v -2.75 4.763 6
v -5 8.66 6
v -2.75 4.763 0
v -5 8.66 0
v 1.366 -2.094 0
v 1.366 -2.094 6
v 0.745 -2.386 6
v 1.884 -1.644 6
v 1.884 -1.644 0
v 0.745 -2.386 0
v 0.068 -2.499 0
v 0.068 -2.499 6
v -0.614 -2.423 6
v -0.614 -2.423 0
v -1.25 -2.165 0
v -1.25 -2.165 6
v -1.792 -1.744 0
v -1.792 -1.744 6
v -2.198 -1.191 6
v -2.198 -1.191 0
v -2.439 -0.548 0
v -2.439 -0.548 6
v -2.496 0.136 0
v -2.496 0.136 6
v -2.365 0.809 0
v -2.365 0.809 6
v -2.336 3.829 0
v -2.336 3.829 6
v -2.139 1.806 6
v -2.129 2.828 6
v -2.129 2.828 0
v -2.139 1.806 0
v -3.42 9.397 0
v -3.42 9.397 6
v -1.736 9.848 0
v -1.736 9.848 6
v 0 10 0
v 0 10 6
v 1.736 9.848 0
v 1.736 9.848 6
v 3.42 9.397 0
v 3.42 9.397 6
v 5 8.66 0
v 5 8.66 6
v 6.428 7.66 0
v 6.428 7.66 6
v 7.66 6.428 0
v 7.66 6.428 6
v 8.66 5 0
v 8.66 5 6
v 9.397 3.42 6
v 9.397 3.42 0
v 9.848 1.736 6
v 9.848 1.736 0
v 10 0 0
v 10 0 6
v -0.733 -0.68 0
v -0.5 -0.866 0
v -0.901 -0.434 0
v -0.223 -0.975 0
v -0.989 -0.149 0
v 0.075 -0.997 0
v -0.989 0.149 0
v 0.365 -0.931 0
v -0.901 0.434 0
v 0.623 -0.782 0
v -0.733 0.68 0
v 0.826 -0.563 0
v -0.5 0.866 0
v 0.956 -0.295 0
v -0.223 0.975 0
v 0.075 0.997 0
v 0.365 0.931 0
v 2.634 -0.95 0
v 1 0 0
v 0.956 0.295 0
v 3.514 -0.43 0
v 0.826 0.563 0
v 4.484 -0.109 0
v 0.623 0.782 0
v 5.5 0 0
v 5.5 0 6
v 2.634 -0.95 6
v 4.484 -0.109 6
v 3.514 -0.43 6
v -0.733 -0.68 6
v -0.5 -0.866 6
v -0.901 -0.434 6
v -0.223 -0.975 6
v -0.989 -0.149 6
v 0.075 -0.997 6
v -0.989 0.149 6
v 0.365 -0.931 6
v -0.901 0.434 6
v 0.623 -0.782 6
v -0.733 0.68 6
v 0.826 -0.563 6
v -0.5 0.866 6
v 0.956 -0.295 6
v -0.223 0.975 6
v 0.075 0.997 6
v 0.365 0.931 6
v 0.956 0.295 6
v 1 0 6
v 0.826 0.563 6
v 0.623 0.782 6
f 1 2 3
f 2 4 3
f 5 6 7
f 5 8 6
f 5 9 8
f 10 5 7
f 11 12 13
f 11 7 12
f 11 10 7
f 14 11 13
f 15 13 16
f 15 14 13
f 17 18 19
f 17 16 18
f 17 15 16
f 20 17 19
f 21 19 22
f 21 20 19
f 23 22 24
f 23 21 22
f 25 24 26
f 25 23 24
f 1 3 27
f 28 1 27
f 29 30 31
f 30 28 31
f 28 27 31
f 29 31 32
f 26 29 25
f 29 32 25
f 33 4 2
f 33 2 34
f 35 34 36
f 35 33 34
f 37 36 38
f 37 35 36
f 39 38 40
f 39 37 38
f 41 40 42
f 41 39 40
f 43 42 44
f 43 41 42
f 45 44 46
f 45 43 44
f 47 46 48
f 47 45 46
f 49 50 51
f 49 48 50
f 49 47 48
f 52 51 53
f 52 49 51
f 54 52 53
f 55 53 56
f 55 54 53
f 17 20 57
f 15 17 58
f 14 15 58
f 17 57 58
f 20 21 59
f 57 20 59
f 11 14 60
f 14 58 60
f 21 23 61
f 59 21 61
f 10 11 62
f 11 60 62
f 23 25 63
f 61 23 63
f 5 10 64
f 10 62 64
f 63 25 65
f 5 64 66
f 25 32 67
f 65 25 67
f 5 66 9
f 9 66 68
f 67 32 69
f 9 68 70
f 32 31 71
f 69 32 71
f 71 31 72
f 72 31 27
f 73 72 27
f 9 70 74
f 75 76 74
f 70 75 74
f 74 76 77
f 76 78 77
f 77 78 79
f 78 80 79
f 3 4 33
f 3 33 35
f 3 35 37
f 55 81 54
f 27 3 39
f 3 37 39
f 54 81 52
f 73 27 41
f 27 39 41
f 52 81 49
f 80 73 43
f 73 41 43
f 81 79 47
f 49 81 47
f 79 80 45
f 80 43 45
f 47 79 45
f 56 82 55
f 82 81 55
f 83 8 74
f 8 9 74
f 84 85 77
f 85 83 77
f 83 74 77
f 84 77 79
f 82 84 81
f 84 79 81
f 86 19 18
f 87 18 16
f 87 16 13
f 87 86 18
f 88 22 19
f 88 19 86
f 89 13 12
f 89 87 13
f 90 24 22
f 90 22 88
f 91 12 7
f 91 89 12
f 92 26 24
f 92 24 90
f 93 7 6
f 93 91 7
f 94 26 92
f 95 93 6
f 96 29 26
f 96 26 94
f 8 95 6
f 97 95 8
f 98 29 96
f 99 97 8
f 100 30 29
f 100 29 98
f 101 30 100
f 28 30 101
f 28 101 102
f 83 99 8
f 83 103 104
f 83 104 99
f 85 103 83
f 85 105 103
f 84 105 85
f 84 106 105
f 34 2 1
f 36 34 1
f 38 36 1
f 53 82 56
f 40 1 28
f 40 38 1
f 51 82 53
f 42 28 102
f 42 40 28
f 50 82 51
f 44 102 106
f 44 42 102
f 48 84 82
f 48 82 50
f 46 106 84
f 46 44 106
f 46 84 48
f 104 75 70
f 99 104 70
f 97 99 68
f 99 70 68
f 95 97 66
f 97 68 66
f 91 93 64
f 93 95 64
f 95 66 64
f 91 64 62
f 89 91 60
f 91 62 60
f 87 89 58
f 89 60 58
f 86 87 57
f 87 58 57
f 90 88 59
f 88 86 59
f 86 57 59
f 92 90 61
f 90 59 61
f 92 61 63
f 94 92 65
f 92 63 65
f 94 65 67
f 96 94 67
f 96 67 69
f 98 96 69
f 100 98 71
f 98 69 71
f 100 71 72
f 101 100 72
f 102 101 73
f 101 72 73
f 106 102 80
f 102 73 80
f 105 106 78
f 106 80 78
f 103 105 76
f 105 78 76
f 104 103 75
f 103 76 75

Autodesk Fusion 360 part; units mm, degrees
sketch "Sketch1" plane through (0, 0, 0) normal (0, 0, 1) x (1, 0, 0) in component "Component"
  circle A0 centre (0, 0) radius 1
  circle A1 centre (0, 0) radius 2.5
  line L0 (0, 0) -> (10, 0) construction
  line L1 (0, 0) -> (-5, 8.6603) construction
  line L2 (0, 0) -> (7.8295, 0) construction
  arc A2 (10, 0) -> (-5, 8.6603) centre (0, 0) ccw
  line L3 (-5, 8.6603) -> (-1.25, 2.1651)
  line L4 (2.5, 0) -> (10, 0)
  line L5 (-1.25, 2.1651) -> (-2.75, 4.7631) construction
  arc A3 (-2.3654, 0.8093) -> (-2.75, 4.7631) centre (-6.9069, 2.3631) ccw
  line L6 (2.5, 0) -> (5.5, 0)
  arc A4 (5.5, 0) -> (1.8836, -1.6438) centre (5.5, -4.8) ccw
  dimension "d1" = 2
  dimension "d2" = 5
  dimension "d3" = 10
  dimension "d4" = 120
  dimension "d5" = 10
  dimension "d6" = 3
  dimension "d7" = 3
extrude "Extrude1" add sketch "Sketch1" along normal blind 6 in component "Component"
component "Component" placed x (1, 0, 0) y (0, 1, 0) z (0, 0, 1) at (0, 0, 0)
equation "d5 = d3"
